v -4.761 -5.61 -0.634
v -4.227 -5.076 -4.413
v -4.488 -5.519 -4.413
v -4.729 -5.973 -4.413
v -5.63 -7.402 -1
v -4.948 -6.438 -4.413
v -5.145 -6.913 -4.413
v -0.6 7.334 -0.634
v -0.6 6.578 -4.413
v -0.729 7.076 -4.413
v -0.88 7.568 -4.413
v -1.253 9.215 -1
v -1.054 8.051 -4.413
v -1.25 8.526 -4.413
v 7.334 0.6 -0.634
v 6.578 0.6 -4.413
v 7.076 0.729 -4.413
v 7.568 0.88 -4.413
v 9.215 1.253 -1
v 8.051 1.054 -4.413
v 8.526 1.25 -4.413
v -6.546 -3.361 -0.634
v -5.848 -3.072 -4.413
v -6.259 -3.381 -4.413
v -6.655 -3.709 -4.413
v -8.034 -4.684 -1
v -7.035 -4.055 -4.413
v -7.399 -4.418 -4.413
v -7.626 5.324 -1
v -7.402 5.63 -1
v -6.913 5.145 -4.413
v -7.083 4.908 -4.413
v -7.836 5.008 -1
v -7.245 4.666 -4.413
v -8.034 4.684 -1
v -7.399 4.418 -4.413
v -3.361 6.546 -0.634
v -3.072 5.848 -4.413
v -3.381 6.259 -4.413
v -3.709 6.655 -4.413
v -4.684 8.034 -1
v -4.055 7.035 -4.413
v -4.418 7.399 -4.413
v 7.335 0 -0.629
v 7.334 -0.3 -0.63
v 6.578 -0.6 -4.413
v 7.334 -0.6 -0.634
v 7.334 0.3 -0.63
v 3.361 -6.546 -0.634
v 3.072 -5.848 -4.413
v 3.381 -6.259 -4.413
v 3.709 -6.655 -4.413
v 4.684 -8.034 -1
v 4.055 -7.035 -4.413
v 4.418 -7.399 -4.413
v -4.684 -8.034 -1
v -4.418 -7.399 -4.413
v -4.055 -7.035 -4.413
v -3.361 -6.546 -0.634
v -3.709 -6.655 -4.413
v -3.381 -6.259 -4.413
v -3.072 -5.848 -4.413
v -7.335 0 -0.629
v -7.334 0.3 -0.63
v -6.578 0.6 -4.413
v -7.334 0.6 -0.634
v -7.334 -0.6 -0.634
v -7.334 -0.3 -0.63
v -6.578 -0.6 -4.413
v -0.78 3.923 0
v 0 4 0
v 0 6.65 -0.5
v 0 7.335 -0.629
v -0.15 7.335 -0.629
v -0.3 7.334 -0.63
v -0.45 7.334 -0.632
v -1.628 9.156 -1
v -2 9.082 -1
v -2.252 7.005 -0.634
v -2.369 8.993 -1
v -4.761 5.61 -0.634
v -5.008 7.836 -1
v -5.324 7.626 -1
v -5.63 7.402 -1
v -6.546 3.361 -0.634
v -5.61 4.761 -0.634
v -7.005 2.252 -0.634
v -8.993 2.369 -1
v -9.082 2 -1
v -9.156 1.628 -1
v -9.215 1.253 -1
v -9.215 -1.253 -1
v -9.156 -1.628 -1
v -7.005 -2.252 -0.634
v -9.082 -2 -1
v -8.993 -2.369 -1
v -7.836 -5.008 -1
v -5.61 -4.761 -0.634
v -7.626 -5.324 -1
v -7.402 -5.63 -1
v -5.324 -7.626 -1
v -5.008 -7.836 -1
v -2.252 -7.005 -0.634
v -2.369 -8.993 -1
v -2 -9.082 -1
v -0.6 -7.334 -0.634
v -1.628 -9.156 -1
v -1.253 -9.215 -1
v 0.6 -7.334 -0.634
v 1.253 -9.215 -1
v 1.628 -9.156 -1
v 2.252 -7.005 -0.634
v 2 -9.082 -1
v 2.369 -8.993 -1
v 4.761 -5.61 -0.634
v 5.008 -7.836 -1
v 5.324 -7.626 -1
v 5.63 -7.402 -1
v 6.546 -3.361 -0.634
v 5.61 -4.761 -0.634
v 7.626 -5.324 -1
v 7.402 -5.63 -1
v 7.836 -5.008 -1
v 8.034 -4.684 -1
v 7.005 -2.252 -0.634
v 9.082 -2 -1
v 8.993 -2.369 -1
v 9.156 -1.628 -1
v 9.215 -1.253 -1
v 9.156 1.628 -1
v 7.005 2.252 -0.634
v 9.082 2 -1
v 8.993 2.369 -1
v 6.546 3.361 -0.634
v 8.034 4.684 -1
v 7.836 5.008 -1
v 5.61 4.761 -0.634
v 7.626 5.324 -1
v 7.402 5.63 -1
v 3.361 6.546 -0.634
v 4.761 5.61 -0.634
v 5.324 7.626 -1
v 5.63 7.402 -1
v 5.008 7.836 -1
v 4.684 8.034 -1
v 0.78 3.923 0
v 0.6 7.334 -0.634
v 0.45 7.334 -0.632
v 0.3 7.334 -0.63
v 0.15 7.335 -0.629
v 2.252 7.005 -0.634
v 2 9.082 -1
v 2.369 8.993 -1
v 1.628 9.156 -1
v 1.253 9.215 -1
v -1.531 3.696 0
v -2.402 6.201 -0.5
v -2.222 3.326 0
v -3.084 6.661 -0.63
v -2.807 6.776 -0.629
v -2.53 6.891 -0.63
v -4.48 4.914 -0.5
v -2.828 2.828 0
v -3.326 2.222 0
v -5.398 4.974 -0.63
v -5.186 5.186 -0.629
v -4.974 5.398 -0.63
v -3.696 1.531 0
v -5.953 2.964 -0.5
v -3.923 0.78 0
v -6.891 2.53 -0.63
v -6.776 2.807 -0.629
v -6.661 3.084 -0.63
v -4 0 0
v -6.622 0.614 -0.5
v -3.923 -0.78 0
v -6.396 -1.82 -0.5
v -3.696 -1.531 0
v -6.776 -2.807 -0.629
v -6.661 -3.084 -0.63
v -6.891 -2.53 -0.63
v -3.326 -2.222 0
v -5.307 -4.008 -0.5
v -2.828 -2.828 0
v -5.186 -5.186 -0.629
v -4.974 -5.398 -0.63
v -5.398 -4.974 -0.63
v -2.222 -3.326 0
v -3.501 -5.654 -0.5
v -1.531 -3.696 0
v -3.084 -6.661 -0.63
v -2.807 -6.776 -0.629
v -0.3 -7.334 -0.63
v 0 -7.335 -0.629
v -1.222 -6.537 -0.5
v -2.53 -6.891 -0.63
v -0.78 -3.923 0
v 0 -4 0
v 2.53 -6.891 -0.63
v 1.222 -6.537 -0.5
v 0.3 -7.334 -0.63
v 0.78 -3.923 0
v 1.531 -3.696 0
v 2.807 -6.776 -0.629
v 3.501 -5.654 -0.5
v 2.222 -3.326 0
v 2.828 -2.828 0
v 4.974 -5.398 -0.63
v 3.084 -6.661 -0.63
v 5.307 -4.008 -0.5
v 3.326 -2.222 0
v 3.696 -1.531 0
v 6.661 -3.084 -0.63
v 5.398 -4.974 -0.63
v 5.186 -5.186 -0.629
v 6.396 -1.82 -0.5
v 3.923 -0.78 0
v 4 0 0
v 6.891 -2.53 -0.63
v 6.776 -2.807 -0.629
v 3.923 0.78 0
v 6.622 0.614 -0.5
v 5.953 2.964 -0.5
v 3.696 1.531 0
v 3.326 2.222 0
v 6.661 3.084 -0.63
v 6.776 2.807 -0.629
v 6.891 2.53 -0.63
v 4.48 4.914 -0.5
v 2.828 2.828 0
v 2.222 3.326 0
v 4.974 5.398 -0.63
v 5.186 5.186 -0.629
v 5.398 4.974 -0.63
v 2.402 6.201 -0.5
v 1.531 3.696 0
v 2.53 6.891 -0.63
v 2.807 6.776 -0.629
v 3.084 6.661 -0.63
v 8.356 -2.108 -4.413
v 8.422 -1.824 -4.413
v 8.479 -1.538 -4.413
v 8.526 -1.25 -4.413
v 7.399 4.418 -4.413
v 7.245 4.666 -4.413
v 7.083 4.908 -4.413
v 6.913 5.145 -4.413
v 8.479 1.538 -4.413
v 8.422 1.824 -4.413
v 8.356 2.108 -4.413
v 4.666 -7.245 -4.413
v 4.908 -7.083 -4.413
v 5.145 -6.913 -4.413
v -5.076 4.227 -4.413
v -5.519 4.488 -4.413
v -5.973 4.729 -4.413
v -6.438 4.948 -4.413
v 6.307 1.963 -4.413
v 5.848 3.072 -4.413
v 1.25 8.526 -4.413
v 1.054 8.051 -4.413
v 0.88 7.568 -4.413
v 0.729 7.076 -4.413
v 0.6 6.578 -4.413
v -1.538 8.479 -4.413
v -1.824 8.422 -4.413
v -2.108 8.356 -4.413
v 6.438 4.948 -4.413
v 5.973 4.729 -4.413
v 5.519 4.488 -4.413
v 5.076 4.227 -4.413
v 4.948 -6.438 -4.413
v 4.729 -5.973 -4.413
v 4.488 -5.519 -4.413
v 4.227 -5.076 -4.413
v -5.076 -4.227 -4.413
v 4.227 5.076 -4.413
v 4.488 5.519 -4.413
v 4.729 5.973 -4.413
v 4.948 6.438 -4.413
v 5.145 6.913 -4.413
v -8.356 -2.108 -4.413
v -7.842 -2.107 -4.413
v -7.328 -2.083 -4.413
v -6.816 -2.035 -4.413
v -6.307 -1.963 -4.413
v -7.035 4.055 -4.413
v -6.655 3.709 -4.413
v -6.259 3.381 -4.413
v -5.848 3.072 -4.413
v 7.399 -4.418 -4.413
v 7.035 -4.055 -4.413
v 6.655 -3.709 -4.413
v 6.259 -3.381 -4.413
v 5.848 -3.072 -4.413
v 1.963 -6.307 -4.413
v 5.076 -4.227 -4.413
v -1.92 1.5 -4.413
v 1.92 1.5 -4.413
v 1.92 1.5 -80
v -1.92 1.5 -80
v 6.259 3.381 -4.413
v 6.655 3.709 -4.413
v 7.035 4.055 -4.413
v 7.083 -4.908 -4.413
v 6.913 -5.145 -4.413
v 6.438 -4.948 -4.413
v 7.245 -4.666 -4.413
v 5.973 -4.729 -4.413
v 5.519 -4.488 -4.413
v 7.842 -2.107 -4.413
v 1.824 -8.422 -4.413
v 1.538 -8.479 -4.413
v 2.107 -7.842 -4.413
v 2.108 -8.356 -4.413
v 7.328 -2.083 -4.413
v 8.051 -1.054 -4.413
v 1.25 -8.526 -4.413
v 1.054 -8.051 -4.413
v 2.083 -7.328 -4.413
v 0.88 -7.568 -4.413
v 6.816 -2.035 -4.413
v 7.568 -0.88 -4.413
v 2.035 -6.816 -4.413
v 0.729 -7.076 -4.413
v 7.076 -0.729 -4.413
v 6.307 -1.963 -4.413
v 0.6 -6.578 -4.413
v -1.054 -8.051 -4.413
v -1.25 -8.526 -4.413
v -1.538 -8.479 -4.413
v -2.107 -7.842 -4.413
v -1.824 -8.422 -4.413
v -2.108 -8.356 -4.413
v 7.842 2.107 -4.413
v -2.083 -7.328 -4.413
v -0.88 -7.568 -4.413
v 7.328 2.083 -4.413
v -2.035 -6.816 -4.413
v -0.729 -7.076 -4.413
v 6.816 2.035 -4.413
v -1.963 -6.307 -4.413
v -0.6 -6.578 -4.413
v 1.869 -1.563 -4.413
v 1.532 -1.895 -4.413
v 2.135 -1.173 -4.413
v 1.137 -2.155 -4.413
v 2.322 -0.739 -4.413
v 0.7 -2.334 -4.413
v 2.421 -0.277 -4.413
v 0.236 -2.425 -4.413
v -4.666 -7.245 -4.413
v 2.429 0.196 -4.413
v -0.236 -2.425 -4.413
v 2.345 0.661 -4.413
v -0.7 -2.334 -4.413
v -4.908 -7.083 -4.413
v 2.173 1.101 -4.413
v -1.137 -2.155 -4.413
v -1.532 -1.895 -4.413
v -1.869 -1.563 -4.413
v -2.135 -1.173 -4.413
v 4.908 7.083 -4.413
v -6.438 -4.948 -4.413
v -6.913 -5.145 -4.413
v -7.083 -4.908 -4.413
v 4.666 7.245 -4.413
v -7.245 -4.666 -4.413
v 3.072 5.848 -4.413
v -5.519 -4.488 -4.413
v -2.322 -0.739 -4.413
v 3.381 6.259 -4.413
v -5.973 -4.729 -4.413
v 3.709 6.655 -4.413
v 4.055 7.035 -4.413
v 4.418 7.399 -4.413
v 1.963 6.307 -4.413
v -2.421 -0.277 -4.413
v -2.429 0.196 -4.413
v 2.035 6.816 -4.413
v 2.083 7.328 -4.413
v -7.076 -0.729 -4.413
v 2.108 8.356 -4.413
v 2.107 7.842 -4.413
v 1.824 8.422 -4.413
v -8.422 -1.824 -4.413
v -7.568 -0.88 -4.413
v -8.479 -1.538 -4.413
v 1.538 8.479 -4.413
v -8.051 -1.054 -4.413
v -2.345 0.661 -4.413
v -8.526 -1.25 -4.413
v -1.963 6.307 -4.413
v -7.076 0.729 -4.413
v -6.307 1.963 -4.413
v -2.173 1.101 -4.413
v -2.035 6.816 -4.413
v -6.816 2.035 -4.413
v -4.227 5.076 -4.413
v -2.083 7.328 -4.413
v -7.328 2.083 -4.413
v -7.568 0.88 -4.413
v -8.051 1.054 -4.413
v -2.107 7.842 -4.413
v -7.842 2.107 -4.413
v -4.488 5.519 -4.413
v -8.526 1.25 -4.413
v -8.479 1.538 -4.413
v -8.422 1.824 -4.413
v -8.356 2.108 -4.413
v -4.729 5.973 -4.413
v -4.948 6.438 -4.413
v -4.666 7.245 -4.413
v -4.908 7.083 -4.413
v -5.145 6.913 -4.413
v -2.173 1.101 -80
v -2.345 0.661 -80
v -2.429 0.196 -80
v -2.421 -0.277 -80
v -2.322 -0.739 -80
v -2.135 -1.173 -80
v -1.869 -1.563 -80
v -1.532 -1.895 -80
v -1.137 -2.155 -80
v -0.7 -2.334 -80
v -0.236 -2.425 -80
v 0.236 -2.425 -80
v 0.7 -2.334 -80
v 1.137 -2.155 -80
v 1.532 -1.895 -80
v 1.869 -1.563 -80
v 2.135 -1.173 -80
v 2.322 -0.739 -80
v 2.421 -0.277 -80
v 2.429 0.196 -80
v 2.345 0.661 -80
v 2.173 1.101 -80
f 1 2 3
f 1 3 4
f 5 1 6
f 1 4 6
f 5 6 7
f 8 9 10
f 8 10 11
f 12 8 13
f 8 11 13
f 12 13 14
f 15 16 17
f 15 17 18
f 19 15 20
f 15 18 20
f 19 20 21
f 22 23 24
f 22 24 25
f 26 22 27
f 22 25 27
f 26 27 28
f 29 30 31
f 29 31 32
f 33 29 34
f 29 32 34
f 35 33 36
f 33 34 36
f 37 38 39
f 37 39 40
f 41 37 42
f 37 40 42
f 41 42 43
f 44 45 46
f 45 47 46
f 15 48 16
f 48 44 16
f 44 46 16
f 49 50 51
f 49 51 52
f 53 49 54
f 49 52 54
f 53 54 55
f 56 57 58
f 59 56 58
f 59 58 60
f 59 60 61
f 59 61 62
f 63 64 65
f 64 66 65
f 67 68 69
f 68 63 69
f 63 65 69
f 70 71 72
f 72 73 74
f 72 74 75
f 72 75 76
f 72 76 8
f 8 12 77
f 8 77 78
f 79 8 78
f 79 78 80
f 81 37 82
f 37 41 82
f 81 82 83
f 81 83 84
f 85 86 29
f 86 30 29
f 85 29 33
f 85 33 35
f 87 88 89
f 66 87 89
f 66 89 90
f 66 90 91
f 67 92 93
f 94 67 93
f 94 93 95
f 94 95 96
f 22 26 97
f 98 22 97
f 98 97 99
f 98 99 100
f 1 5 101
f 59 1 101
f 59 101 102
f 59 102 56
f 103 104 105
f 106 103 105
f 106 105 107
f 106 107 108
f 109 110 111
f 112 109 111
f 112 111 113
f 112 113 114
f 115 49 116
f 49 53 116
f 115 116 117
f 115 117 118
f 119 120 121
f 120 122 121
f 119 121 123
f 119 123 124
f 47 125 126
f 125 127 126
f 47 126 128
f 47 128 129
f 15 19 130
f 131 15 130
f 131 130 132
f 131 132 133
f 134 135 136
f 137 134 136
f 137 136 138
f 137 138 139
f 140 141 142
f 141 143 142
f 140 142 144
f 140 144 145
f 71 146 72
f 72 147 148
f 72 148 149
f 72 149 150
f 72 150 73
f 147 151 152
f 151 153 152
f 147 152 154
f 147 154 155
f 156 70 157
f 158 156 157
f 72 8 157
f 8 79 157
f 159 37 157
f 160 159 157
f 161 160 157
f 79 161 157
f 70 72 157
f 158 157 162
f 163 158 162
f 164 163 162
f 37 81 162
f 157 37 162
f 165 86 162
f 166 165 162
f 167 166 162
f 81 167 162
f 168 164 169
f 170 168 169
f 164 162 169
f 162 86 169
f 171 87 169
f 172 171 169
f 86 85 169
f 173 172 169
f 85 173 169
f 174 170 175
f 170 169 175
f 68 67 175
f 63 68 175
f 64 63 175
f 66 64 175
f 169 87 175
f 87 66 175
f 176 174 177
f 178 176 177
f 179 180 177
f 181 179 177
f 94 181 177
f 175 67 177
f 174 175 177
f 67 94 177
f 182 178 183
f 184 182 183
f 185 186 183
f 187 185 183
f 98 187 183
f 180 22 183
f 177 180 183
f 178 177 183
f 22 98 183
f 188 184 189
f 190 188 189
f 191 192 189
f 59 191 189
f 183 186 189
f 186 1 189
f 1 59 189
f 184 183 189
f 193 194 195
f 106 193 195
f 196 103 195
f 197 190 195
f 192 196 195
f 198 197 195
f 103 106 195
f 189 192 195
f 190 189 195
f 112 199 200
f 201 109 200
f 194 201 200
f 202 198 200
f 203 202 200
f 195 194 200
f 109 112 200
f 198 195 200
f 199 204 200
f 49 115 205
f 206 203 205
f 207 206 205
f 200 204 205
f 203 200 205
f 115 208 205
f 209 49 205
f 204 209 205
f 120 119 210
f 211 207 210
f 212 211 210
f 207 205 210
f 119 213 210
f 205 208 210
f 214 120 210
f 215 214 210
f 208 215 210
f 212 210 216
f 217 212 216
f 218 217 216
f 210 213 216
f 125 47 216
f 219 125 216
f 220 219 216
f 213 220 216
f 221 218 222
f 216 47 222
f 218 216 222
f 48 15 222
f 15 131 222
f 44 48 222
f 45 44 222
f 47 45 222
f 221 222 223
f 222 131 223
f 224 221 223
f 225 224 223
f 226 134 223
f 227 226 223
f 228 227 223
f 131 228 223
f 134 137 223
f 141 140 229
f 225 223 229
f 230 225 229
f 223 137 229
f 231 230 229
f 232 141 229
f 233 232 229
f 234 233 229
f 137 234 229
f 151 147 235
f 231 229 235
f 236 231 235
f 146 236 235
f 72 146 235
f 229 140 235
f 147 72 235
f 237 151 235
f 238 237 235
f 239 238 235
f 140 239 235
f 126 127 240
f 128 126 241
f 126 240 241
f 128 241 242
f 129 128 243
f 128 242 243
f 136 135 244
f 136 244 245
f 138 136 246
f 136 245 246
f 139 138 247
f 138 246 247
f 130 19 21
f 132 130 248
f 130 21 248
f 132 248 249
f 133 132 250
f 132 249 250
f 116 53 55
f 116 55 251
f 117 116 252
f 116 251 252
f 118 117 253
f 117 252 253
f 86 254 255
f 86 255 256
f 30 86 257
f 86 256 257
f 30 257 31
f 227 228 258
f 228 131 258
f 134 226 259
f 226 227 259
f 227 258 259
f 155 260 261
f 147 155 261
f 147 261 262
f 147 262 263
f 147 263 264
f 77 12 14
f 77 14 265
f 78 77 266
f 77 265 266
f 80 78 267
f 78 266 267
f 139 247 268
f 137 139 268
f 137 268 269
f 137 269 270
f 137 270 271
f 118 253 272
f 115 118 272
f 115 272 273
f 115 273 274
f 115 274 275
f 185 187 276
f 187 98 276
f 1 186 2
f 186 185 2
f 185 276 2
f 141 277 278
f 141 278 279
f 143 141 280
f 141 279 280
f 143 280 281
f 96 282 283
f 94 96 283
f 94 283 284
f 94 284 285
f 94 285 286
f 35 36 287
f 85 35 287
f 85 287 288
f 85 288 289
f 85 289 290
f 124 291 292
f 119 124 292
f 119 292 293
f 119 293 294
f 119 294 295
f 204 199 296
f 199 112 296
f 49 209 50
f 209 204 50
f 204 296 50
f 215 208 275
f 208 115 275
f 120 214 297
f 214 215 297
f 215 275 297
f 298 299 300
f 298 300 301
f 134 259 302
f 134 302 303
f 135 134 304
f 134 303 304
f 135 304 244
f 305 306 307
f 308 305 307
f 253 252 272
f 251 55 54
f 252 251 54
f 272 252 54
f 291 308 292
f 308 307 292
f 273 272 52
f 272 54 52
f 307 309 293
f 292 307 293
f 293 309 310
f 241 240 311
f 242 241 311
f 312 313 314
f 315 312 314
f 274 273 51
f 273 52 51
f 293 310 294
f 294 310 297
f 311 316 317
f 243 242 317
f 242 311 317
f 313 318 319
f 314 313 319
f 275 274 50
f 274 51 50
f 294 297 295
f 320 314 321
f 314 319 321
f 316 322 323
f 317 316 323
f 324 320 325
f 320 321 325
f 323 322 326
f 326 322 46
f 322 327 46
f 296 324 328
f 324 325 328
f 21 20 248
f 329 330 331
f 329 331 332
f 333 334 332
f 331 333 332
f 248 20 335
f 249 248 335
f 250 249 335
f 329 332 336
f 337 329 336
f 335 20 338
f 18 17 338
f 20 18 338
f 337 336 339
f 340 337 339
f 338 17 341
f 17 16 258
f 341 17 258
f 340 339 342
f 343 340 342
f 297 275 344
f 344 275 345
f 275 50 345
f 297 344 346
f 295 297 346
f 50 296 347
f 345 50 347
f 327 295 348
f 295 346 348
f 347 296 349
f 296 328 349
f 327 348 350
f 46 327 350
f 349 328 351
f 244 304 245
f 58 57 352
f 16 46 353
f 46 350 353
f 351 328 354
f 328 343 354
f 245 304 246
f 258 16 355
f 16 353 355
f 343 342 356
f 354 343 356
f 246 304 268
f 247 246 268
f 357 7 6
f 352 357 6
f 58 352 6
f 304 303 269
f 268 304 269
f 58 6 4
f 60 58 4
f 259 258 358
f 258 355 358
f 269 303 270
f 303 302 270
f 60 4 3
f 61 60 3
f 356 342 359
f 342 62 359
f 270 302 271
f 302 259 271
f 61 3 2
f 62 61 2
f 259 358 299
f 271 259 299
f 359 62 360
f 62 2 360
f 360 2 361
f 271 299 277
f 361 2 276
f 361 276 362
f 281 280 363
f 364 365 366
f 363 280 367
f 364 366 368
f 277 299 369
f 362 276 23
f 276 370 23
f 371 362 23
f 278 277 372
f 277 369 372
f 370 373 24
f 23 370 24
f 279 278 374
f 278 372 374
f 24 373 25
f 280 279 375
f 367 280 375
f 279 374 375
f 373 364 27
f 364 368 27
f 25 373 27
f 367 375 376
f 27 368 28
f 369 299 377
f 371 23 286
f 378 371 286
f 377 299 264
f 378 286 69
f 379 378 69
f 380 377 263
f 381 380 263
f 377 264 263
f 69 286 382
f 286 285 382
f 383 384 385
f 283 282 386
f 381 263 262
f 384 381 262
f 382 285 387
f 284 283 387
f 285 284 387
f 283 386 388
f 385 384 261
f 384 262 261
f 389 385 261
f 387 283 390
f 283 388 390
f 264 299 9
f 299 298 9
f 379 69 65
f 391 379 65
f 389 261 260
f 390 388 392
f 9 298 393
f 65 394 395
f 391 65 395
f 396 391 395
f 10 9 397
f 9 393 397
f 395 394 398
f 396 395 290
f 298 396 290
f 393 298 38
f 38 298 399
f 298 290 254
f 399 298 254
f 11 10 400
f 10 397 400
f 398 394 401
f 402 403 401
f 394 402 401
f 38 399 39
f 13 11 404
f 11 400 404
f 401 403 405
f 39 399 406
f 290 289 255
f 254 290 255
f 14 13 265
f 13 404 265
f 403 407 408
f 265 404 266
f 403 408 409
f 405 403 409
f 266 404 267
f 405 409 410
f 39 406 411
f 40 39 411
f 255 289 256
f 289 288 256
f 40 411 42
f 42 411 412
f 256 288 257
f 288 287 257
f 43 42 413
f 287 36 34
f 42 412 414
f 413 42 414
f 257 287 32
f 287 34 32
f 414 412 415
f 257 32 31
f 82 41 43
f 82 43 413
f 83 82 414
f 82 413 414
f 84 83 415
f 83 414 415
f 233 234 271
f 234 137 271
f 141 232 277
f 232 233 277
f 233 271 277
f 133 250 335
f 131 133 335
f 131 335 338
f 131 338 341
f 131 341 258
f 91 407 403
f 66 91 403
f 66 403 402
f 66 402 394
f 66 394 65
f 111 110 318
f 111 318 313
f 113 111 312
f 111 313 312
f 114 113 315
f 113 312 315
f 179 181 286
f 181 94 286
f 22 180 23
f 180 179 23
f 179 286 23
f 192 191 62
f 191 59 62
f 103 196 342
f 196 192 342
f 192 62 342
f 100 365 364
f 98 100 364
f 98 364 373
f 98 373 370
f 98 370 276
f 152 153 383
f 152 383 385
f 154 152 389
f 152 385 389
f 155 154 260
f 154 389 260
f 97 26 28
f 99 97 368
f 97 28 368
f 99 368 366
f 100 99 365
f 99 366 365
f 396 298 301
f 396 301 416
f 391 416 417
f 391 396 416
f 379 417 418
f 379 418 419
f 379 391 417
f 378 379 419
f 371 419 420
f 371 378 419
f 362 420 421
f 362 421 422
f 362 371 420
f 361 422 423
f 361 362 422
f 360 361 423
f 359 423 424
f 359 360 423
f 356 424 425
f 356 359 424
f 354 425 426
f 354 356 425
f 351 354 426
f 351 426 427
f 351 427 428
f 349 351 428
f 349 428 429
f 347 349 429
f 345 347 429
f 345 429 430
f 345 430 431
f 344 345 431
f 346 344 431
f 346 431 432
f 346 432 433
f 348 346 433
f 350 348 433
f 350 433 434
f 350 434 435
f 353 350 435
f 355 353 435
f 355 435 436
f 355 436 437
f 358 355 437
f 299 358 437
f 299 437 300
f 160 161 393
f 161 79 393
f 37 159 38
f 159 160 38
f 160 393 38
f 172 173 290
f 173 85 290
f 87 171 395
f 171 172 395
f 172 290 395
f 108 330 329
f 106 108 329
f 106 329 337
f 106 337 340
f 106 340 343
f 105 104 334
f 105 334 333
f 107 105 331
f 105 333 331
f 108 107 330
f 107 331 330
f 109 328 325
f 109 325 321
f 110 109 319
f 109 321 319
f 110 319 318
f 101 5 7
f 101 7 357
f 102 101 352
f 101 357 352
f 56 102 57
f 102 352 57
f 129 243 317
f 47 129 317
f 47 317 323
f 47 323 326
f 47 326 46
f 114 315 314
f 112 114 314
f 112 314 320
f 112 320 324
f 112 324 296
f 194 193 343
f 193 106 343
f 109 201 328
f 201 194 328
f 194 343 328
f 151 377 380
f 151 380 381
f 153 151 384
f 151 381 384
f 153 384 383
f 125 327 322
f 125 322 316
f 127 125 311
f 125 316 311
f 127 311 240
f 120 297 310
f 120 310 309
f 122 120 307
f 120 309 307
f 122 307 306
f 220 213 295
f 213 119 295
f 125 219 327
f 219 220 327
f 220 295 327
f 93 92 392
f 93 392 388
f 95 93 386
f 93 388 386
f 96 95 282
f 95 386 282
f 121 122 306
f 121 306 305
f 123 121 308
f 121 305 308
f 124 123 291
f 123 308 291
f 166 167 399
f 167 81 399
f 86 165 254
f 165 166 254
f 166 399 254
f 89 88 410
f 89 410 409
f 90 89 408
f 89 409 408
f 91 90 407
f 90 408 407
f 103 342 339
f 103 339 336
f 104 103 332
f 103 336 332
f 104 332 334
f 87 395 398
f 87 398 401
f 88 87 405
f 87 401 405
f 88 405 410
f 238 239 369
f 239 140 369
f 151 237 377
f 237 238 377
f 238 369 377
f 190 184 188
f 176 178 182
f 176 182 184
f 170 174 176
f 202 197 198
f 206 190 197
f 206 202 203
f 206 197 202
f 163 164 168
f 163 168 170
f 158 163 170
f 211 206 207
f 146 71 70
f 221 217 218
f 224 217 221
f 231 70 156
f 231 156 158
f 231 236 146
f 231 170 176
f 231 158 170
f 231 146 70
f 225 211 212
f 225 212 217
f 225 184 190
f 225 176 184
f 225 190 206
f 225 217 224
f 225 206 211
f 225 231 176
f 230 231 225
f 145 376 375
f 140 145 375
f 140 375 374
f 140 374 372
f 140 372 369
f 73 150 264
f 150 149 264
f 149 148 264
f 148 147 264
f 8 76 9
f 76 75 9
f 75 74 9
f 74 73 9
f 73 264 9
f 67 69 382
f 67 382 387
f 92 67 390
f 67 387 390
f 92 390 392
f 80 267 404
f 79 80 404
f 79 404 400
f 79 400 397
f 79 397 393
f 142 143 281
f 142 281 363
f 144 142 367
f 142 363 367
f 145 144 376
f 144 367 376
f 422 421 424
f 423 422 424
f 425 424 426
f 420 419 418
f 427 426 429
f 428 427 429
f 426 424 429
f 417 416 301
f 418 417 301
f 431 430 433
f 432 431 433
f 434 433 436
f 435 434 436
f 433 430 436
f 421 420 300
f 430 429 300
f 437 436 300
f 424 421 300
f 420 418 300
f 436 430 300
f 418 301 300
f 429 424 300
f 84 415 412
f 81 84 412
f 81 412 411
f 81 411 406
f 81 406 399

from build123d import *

# Parameters (mm, degrees)
CUT_EXTRUDE1_DEPTH  = 21.72734614
CIRPATTERN1_COUNT   = 16
BOSS_EXTRUDE2_START = -4.412612
BOSS_EXTRUDE2_DEPTH = 80


with BuildPart() as part:
    # Sketch2 → Revolve1 (revolve)
    with BuildSketch(Plane(origin=(0, 0, 0), x_dir=(0, 0, -1), z_dir=(1, 0, 0))):
        Polygon((0, 0), (0, 4), (1, 9.299998774), (4.412612001, 8.617472191), (4.412612001, 0), align=None)
    revolve(axis=Axis((0, 0, -4.412612001), (0, 0, 1)))

    # Sketch6 → Cut-Extrude1 (cut, through all)
    with BuildSketch(Plane(origin=(0, 8.421354901, -5.393192445), x_dir=(-1, 0, 0), z_dir=(0, -0.19611729080207105, -0.9805804445574345))):
        with BuildLine():
            Line((-0.6, -2), (0.6, -2))
            ThreePointArc((0.6, -2), (1.069979771, -0.514520871), (1.75, 0.887299986))
            ThreePointArc((1.75, 0.887299986), (0, 1.049875288), (-1.75, 0.887299986))
            ThreePointArc((-1.75, 0.887299986), (-1.069979771, -0.514520871), (-0.6, -2))
        make_face()
    cut_extrude1 = extrude(amount=-CUT_EXTRUDE1_DEPTH, mode=Mode.SUBTRACT)

    # CirPattern1: Cut-Extrude1 ×16 about axis
    cirpattern1_axis = Axis((0, 0, 0), (0, 0, 1))
    for i in range(1, CIRPATTERN1_COUNT):
        add(cut_extrude1.rotate(cirpattern1_axis, i * 360 / CIRPATTERN1_COUNT), mode=Mode.SUBTRACT)

    # Sketch7 → Boss-Extrude2 (add)
    with BuildSketch(Plane(origin=(0, 0, -4.412612001), x_dir=(-1, 0, 0), z_dir=(0, 0, -1)).offset(BOSS_EXTRUDE2_START)):
        with BuildLine():
            Line((-1.92003444, 1.5), (1.92003444, 1.5))
            ThreePointArc((1.92003444, 1.5), (0, -2.4365), (-1.92003444, 1.5))
        make_face()
    extrude(amount=BOSS_EXTRUDE2_DEPTH)


solid = part.part
